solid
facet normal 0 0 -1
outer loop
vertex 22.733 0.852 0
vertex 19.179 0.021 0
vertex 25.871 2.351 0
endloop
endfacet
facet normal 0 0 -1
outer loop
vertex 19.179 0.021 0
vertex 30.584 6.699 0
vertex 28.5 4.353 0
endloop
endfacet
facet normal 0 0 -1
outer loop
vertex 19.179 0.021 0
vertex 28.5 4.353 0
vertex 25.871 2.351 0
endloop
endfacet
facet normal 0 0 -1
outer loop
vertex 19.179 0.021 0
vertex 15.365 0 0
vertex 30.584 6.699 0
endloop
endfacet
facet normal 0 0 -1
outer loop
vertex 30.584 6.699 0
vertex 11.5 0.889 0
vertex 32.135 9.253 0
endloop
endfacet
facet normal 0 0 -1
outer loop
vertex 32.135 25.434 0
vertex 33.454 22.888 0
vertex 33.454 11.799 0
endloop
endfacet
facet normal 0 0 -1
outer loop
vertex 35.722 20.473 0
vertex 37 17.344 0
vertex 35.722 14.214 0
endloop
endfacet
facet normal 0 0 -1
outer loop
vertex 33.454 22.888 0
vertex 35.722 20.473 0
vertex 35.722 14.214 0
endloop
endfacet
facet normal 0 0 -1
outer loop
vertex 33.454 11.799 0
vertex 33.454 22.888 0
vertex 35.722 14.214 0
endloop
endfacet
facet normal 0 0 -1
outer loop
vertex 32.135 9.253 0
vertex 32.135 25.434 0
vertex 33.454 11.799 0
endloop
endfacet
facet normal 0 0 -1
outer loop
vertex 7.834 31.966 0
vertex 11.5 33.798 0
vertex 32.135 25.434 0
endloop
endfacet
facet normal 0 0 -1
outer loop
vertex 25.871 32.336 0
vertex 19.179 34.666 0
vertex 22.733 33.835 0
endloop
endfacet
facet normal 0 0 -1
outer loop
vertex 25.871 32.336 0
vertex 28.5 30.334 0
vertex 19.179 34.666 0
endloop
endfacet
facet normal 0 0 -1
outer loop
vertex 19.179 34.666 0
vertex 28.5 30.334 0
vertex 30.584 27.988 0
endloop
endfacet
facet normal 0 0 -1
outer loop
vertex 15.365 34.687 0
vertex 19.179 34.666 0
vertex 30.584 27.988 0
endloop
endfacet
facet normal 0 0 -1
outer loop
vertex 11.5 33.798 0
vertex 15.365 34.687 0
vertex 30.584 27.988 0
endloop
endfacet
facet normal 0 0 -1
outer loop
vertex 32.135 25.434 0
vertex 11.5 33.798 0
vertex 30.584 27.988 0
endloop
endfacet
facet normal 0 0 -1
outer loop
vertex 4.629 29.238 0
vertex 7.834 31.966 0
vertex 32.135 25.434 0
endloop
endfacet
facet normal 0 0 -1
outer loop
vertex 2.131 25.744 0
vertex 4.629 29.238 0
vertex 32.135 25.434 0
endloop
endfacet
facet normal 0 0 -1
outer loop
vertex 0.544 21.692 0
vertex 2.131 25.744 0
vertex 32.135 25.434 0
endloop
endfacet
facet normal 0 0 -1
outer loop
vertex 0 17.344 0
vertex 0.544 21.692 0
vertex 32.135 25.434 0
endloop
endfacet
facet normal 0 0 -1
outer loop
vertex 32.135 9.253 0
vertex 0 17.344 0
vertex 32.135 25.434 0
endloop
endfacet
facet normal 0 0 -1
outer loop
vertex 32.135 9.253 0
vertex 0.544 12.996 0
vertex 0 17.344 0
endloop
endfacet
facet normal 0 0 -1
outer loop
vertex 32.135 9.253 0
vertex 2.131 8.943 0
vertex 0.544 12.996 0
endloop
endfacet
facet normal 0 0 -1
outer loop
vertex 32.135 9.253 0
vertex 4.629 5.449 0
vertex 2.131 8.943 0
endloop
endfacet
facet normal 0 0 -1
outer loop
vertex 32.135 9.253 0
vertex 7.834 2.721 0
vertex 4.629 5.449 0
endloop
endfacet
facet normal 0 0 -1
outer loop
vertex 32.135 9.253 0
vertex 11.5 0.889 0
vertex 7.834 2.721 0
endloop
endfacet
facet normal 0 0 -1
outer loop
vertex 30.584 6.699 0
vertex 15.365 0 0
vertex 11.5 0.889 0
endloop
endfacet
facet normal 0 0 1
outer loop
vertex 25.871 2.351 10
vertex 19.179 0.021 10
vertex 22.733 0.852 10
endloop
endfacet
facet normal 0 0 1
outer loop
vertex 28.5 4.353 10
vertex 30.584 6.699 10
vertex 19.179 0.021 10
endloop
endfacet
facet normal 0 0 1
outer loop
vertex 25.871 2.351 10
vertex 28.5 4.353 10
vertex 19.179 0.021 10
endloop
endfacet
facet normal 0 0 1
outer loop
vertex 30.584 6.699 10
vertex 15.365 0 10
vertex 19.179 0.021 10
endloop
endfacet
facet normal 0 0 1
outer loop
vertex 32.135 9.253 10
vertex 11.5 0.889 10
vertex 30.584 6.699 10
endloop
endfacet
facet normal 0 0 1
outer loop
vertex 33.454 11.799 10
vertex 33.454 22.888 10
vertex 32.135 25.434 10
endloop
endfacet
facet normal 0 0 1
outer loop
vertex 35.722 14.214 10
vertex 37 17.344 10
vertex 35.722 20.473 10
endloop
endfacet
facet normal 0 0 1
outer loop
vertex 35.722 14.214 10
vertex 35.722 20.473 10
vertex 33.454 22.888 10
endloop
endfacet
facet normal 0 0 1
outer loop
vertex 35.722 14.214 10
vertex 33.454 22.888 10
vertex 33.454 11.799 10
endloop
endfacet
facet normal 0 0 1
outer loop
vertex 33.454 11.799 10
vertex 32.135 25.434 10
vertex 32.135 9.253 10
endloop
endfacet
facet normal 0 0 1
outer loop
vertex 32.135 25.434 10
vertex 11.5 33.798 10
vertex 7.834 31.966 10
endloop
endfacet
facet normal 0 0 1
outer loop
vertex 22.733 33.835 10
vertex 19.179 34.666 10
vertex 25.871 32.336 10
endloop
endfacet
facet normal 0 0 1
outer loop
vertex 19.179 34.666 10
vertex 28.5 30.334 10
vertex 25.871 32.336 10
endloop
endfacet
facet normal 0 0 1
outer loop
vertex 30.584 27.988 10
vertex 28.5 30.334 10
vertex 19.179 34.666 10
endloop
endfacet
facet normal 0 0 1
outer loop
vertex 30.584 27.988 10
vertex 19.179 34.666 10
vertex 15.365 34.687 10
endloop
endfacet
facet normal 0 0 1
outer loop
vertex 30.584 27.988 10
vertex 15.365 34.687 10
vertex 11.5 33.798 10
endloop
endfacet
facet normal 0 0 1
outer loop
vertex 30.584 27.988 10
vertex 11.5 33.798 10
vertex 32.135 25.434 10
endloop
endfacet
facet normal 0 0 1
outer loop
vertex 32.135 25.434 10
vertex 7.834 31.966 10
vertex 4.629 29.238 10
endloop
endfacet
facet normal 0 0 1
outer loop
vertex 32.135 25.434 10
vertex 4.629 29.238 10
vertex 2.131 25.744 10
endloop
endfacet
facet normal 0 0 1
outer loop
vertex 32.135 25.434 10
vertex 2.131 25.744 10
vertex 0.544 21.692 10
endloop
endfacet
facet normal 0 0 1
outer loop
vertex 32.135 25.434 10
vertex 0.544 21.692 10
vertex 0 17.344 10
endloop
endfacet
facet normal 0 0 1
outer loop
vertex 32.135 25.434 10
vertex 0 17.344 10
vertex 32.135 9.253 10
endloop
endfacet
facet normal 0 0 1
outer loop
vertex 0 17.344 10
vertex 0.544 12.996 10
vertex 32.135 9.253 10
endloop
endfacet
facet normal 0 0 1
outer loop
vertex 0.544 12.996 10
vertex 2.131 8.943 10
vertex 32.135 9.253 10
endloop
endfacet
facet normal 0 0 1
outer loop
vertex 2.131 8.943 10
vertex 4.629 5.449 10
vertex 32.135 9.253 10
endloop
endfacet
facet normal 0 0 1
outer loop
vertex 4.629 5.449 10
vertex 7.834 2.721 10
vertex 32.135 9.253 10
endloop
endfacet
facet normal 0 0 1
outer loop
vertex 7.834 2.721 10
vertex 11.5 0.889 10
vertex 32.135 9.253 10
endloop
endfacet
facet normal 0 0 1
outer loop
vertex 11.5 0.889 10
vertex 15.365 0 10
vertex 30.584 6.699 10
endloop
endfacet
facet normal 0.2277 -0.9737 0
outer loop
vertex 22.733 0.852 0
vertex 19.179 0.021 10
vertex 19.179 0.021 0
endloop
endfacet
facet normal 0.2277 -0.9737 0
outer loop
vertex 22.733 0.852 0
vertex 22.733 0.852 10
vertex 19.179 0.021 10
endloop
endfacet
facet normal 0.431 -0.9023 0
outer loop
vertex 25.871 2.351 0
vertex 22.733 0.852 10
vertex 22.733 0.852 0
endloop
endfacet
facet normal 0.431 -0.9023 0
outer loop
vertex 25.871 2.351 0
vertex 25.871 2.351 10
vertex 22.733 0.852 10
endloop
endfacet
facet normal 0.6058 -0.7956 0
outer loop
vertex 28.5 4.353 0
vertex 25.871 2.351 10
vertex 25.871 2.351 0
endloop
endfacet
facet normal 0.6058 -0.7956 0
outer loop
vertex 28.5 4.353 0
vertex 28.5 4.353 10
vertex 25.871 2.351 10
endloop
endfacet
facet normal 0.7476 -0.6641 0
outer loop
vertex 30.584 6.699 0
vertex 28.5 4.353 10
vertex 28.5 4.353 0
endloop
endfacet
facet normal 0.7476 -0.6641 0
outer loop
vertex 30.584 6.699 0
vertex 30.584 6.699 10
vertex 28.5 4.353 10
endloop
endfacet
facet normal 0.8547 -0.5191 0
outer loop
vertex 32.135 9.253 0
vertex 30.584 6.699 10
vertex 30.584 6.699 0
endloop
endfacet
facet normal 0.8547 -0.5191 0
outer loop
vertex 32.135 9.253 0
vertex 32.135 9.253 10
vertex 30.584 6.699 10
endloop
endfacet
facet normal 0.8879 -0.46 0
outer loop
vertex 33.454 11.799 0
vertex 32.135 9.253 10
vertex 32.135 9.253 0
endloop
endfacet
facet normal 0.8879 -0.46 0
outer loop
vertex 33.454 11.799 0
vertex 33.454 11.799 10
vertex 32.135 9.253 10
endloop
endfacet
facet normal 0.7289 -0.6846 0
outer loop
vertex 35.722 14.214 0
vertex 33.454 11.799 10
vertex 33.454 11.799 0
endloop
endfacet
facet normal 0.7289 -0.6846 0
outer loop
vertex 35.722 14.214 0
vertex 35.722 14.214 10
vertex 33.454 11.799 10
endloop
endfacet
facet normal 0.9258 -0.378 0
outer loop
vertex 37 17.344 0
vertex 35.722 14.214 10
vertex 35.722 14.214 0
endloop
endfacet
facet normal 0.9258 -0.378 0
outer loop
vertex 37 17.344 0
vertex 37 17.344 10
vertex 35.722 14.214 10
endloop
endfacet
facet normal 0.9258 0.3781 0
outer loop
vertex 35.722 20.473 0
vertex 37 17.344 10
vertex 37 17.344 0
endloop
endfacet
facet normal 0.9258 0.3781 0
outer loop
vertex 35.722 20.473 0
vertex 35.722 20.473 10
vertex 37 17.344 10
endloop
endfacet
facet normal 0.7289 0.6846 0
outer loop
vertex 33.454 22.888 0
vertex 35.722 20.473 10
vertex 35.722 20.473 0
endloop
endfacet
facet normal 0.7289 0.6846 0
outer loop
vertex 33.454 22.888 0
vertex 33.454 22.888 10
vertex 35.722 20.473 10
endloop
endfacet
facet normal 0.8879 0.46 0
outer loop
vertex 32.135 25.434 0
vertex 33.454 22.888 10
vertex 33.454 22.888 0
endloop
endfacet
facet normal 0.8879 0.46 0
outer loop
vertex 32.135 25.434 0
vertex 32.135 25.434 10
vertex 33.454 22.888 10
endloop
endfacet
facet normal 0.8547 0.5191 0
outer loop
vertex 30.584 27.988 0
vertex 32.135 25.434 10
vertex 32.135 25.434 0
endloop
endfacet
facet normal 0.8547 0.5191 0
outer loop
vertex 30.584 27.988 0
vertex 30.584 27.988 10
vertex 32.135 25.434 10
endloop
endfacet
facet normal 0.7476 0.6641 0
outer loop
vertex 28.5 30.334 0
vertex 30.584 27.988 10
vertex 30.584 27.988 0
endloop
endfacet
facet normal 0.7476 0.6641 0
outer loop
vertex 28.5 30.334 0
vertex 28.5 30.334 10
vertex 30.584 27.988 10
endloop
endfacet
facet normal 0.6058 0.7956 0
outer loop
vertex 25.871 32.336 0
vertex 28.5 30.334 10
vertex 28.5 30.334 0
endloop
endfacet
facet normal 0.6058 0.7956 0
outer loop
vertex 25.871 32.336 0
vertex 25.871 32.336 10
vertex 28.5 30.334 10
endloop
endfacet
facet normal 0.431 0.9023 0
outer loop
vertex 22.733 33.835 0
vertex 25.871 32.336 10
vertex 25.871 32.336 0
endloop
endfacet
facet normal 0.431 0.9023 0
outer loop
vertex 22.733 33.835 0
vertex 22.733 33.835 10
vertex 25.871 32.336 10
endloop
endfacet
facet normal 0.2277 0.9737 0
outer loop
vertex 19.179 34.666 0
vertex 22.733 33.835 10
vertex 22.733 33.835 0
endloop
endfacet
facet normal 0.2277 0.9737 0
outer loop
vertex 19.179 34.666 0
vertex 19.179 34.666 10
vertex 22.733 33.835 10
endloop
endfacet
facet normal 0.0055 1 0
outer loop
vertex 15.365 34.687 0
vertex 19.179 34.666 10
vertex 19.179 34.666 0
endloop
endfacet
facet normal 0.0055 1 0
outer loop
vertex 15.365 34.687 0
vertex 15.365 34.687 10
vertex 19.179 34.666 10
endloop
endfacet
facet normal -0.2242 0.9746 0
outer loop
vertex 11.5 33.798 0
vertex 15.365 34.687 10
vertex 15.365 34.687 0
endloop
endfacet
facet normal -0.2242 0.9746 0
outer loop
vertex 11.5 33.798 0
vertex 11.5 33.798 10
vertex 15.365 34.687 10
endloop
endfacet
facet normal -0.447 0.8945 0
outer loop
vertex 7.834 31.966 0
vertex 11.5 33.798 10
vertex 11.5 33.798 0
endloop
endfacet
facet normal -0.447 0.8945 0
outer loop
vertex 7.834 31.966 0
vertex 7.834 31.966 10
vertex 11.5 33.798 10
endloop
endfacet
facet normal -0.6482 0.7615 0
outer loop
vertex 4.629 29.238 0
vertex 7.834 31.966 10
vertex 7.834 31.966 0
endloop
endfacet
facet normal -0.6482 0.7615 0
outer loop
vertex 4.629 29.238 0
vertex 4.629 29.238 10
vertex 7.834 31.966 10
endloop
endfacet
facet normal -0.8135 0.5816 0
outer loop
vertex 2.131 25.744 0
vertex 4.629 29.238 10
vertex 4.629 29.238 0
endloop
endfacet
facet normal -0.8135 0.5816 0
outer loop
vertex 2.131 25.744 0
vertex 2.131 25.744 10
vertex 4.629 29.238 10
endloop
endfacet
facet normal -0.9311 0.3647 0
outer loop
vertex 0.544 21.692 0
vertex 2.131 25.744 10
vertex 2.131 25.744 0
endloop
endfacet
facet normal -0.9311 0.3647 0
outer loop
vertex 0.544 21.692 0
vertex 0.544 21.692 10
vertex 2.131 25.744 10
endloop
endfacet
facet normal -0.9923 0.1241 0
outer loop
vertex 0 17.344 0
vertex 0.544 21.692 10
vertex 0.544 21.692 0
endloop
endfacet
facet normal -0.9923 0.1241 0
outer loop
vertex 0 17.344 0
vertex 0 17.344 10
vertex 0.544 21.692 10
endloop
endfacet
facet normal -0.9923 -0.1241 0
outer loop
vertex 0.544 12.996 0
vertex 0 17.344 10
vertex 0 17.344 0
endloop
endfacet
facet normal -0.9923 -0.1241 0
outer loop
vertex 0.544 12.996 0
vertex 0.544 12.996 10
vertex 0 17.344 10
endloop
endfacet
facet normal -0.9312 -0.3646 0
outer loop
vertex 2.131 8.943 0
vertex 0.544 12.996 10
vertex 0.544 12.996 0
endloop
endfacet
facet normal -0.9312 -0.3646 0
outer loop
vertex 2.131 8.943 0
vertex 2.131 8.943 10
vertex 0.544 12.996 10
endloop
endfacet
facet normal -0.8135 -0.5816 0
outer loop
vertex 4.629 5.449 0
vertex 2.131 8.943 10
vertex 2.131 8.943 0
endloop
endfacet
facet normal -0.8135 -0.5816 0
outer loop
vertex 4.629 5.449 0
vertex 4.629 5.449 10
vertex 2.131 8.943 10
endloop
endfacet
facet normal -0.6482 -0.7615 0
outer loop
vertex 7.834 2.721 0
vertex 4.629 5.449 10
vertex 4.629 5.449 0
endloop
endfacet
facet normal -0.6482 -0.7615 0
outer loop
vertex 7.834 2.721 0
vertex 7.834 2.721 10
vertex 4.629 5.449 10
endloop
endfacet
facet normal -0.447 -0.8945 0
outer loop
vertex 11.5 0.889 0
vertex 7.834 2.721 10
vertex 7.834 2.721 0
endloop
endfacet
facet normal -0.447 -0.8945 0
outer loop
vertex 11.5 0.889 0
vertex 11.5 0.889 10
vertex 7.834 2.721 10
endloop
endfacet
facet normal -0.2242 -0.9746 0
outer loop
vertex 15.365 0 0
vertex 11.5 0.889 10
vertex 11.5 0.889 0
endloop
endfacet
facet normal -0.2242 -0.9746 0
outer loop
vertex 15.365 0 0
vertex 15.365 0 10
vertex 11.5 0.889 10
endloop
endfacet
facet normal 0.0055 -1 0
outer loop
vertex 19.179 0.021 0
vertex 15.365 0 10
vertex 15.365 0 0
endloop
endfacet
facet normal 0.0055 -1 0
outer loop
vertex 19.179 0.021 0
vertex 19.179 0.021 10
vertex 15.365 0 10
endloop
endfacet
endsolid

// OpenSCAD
$fn = 32;

// ----------------------------------------------------------------------
// Cam disc: base radius 13.0 mm, lift 8.0 mm, 30 profile points
// ----------------------------------------------------------------------

// --- parameters (mm) ---
profile_height = 10;      // extrusion height
profile_points = 30;      // points of the closed outline

profile = [[37, 17.344], [35.722, 20.473], [33.454, 22.888], [32.135, 25.434], [30.584, 27.988], [28.5, 30.334], [25.871, 32.336], [22.733, 33.835], [19.179, 34.666], [15.365, 34.687], [11.5, 33.798], [7.834, 31.966], [4.629, 29.238], [2.131, 25.744], [0.544, 21.692], [0, 17.344], [0.544, 12.996], [2.131, 8.943], [4.629, 5.449], [7.834, 2.721], [11.5, 0.889], [15.365, 0], [19.179, 0.021], [22.733, 0.852], [25.871, 2.351], [28.5, 4.353], [30.584, 6.699], [32.135, 9.253], [33.454, 11.799], [35.722, 14.214]];  // single closed polygon, 30 points, counter clockwise

// --- the one profile operation ---
linear_extrude(height = profile_height) polygon(points = profile);
